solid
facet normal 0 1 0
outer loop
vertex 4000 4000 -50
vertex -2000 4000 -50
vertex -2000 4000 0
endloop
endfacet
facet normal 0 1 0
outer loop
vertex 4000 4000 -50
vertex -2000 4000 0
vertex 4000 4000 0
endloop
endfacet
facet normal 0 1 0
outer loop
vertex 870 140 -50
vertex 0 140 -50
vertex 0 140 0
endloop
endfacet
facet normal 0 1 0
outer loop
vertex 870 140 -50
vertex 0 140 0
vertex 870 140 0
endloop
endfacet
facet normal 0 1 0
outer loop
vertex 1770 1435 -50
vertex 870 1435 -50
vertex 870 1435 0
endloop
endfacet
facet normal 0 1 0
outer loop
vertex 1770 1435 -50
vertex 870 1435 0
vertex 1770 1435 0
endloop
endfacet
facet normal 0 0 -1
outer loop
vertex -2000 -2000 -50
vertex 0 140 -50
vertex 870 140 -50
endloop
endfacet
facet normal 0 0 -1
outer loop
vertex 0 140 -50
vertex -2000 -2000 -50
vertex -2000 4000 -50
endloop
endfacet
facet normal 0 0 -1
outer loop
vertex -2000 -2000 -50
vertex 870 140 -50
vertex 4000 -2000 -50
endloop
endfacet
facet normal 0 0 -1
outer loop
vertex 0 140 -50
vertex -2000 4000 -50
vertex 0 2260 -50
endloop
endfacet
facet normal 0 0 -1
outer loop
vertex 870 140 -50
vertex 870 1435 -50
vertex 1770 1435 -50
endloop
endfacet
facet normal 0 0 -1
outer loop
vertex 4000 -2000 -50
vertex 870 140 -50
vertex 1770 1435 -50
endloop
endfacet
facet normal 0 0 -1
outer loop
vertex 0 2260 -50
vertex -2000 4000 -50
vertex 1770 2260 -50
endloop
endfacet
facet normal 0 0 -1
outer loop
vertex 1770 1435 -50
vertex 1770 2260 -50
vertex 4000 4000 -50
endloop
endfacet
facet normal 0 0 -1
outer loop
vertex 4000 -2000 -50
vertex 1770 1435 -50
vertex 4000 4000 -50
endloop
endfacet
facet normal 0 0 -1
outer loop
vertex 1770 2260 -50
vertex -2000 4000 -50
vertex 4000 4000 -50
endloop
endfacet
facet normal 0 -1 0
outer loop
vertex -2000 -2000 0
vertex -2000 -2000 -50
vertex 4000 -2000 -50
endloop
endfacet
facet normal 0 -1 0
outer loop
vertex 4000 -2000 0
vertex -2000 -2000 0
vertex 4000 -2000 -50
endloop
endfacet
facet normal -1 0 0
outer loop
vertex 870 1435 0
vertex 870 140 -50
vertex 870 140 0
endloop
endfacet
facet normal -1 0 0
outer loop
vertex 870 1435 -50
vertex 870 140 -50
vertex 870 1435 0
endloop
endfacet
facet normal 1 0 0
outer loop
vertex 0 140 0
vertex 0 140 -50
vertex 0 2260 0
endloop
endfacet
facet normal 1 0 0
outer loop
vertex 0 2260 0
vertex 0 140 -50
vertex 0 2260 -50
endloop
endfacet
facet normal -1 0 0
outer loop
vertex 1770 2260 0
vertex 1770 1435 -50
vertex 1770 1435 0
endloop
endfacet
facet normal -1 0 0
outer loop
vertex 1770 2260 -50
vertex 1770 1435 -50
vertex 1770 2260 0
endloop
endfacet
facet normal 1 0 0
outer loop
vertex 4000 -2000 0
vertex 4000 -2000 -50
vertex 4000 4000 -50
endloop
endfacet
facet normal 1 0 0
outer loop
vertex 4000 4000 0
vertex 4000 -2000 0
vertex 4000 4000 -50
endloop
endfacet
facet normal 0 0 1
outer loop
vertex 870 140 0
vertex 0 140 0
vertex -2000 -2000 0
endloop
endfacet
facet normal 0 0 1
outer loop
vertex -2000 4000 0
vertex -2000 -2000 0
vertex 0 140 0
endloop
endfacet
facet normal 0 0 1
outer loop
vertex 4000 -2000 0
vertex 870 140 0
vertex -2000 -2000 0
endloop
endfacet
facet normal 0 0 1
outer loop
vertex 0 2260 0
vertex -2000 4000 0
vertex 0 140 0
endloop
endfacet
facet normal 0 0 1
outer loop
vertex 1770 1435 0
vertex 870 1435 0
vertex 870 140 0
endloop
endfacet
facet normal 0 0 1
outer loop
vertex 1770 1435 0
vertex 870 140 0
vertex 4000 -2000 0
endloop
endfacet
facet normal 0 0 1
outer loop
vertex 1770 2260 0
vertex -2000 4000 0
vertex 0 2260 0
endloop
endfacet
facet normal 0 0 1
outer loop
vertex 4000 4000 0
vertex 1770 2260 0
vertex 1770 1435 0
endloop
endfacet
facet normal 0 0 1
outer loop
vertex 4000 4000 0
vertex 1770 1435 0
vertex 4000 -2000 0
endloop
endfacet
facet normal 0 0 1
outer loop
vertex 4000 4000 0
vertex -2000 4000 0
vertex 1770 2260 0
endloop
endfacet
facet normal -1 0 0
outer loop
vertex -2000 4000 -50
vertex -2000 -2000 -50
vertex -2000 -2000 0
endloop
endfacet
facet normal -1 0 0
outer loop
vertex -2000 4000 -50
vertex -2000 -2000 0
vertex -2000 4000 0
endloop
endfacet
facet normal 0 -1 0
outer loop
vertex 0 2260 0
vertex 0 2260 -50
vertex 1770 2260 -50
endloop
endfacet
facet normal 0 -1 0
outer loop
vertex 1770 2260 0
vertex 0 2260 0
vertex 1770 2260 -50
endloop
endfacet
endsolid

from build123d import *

# Parameters (mm, degrees)
BOX001_W     = 900
BOX001_H     = 825
BOX001_DEPTH = 50
BOX_W        = 870
BOX_H        = 2120
BOX_DEPTH    = 50
BOX002_W     = 6000
BOX002_H     = 6000
BOX002_DEPTH = 50


with BuildPart() as vao2:
    # Box001 → Box001 (new body)
    with BuildSketch(Plane(origin=(870, 1295, -50), x_dir=(1, 0, 0), z_dir=(0, 0, 1))):
        with Locations((450, 412.5)):
            Rectangle(BOX001_W, BOX001_H)
    extrude(amount=BOX001_DEPTH)


with BuildPart() as vao:
    # Box → Box (new body)
    with BuildSketch(Plane.XY.offset(-50)):
        with Locations((435, 1060)):
            Rectangle(BOX_W, BOX_H)
    extrude(amount=BOX_DEPTH)

    # Fusion: union vao2
    add(vao2.part)


with BuildPart() as vao_1:
    # Fusion placement: moved
    add(vao.part.moved(Location((0, 140, 0))))


with BuildPart() as vao_na_laje:
    # Box002 → Box002 (new body)
    with BuildSketch(Plane(origin=(-2000, -2000, -50), x_dir=(1, 0, 0), z_dir=(0, 0, 1))):
        with Locations((3000, 3000)):
            Rectangle(BOX002_W, BOX002_H)
    extrude(amount=BOX002_DEPTH)

    # Cut: cut vao
    add(vao_1.part, mode=Mode.SUBTRACT)


solid = vao_na_laje.part
